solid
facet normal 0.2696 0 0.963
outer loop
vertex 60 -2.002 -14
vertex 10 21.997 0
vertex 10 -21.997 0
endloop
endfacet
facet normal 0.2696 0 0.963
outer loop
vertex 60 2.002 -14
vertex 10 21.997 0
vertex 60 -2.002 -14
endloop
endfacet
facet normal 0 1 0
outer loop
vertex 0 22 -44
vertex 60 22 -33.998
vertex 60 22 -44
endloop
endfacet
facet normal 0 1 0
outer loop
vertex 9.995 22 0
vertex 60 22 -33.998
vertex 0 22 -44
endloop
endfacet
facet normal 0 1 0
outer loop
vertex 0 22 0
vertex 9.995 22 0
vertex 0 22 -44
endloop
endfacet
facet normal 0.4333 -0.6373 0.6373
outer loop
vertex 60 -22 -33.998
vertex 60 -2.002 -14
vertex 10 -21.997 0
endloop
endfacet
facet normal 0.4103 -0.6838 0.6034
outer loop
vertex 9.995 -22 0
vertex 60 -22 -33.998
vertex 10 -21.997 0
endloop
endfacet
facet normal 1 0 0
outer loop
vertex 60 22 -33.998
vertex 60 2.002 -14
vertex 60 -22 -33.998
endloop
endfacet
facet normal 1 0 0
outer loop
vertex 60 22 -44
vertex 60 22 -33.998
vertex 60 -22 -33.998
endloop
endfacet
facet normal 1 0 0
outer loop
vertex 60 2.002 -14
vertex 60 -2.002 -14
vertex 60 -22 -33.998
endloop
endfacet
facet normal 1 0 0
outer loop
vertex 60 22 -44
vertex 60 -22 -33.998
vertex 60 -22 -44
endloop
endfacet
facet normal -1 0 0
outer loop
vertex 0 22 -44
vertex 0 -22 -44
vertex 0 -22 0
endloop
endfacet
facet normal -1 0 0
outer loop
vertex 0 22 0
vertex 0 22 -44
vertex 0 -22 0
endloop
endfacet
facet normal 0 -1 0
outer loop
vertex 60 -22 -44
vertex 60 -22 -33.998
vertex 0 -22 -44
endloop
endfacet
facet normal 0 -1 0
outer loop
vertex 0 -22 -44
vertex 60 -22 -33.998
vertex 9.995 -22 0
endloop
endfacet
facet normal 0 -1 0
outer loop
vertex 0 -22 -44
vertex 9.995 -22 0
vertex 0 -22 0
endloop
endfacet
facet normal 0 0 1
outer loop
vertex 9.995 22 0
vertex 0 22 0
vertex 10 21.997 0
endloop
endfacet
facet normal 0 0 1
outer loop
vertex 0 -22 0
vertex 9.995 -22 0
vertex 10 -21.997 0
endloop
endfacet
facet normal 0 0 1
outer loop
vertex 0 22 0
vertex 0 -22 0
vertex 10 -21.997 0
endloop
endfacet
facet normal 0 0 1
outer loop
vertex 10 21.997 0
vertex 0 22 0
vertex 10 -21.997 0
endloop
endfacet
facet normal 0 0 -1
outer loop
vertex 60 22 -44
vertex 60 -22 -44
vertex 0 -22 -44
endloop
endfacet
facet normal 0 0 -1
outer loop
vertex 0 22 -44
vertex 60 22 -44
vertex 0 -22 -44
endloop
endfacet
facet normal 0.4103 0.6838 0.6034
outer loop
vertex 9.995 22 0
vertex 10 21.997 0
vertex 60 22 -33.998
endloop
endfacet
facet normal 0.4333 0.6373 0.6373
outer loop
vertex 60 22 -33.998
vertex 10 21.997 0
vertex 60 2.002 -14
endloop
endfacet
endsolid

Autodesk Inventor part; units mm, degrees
ref_plane "YZ Plane" through (0, 0, 0) normal (1, 0, 0) x (0, 1, 0)
ref_plane "XZ Plane" through (0, 0, 0) normal (0, 1, 0) x (-1, 0, 0)
sketch "草圖1" plane through (0, 0, 0) normal (0, 1, 0) x (-1, 0, 0)
  line L0 (0, 0) -> (-60, 0)
  line L1 (-60, 0) -> (-60, -44)
  line L2 (-60, -44) -> (0, -44)
  line L3 (0, -44) -> (0, 0)
  dimension "d0" = 60
  dimension "d1" = 44
extrude "擠出1" add sketch "草圖1" along normal mid plane 44
sketch "草圖2" plane through (0, 22, 0) normal (0, 1, 0) x (1, 0, 0)
  line L0 (0, 0) -> (60, 0) projected
  line L1 (10, 0) -> (60, 14)
  line L2 (60, 0) -> (60, 44) projected
  dimension "d4" = 10
  dimension "d5" = 30
extrude "擠出2" cut sketch "草圖2" against normal blind 60
sketch "草圖3" plane through (60, -22, -44) normal (1, 0, 0) x (0, 0, -1)
  line L0 (-30, 24) -> (-10, 44)
  line L1 (0, 44) -> (-44, 44) projected
  line L2 (-30, 44) -> (-30, 0) projected
  point P0 (-44, 22)
  point P1 (-30, 2)
  dimension "d8" = 20
  dimension "d9" = 20
ref_plane "工作平面1" through (10, 22, 0) normal (-0.4333, -0.6373, -0.6373) x (0.8269, 0, -0.5623)
sketch "草圖4" plane through (10, 22, 0) normal (-0.4333, -0.6373, -0.6373) x (0.8269, 0, -0.5623)
  line L0 (-15.1543, -12.3218) -> (93.717, -12.3218)
  line L1 (93.717, -12.3218) -> (93.717, 28.8166)
  line L2 (93.717, 28.8166) -> (-15.1543, 28.8166)
  line L3 (-15.1543, 28.8166) -> (-15.1543, -12.3218)
  point P0 (-8.2693, 13.3708)
extrude "擠出3" cut sketch "草圖4" against normal blind 40
mirror "鏡射1" about plane through (0, 0, 0) normal (0, 1, 0) of "擠出3"
properties part number "63"
